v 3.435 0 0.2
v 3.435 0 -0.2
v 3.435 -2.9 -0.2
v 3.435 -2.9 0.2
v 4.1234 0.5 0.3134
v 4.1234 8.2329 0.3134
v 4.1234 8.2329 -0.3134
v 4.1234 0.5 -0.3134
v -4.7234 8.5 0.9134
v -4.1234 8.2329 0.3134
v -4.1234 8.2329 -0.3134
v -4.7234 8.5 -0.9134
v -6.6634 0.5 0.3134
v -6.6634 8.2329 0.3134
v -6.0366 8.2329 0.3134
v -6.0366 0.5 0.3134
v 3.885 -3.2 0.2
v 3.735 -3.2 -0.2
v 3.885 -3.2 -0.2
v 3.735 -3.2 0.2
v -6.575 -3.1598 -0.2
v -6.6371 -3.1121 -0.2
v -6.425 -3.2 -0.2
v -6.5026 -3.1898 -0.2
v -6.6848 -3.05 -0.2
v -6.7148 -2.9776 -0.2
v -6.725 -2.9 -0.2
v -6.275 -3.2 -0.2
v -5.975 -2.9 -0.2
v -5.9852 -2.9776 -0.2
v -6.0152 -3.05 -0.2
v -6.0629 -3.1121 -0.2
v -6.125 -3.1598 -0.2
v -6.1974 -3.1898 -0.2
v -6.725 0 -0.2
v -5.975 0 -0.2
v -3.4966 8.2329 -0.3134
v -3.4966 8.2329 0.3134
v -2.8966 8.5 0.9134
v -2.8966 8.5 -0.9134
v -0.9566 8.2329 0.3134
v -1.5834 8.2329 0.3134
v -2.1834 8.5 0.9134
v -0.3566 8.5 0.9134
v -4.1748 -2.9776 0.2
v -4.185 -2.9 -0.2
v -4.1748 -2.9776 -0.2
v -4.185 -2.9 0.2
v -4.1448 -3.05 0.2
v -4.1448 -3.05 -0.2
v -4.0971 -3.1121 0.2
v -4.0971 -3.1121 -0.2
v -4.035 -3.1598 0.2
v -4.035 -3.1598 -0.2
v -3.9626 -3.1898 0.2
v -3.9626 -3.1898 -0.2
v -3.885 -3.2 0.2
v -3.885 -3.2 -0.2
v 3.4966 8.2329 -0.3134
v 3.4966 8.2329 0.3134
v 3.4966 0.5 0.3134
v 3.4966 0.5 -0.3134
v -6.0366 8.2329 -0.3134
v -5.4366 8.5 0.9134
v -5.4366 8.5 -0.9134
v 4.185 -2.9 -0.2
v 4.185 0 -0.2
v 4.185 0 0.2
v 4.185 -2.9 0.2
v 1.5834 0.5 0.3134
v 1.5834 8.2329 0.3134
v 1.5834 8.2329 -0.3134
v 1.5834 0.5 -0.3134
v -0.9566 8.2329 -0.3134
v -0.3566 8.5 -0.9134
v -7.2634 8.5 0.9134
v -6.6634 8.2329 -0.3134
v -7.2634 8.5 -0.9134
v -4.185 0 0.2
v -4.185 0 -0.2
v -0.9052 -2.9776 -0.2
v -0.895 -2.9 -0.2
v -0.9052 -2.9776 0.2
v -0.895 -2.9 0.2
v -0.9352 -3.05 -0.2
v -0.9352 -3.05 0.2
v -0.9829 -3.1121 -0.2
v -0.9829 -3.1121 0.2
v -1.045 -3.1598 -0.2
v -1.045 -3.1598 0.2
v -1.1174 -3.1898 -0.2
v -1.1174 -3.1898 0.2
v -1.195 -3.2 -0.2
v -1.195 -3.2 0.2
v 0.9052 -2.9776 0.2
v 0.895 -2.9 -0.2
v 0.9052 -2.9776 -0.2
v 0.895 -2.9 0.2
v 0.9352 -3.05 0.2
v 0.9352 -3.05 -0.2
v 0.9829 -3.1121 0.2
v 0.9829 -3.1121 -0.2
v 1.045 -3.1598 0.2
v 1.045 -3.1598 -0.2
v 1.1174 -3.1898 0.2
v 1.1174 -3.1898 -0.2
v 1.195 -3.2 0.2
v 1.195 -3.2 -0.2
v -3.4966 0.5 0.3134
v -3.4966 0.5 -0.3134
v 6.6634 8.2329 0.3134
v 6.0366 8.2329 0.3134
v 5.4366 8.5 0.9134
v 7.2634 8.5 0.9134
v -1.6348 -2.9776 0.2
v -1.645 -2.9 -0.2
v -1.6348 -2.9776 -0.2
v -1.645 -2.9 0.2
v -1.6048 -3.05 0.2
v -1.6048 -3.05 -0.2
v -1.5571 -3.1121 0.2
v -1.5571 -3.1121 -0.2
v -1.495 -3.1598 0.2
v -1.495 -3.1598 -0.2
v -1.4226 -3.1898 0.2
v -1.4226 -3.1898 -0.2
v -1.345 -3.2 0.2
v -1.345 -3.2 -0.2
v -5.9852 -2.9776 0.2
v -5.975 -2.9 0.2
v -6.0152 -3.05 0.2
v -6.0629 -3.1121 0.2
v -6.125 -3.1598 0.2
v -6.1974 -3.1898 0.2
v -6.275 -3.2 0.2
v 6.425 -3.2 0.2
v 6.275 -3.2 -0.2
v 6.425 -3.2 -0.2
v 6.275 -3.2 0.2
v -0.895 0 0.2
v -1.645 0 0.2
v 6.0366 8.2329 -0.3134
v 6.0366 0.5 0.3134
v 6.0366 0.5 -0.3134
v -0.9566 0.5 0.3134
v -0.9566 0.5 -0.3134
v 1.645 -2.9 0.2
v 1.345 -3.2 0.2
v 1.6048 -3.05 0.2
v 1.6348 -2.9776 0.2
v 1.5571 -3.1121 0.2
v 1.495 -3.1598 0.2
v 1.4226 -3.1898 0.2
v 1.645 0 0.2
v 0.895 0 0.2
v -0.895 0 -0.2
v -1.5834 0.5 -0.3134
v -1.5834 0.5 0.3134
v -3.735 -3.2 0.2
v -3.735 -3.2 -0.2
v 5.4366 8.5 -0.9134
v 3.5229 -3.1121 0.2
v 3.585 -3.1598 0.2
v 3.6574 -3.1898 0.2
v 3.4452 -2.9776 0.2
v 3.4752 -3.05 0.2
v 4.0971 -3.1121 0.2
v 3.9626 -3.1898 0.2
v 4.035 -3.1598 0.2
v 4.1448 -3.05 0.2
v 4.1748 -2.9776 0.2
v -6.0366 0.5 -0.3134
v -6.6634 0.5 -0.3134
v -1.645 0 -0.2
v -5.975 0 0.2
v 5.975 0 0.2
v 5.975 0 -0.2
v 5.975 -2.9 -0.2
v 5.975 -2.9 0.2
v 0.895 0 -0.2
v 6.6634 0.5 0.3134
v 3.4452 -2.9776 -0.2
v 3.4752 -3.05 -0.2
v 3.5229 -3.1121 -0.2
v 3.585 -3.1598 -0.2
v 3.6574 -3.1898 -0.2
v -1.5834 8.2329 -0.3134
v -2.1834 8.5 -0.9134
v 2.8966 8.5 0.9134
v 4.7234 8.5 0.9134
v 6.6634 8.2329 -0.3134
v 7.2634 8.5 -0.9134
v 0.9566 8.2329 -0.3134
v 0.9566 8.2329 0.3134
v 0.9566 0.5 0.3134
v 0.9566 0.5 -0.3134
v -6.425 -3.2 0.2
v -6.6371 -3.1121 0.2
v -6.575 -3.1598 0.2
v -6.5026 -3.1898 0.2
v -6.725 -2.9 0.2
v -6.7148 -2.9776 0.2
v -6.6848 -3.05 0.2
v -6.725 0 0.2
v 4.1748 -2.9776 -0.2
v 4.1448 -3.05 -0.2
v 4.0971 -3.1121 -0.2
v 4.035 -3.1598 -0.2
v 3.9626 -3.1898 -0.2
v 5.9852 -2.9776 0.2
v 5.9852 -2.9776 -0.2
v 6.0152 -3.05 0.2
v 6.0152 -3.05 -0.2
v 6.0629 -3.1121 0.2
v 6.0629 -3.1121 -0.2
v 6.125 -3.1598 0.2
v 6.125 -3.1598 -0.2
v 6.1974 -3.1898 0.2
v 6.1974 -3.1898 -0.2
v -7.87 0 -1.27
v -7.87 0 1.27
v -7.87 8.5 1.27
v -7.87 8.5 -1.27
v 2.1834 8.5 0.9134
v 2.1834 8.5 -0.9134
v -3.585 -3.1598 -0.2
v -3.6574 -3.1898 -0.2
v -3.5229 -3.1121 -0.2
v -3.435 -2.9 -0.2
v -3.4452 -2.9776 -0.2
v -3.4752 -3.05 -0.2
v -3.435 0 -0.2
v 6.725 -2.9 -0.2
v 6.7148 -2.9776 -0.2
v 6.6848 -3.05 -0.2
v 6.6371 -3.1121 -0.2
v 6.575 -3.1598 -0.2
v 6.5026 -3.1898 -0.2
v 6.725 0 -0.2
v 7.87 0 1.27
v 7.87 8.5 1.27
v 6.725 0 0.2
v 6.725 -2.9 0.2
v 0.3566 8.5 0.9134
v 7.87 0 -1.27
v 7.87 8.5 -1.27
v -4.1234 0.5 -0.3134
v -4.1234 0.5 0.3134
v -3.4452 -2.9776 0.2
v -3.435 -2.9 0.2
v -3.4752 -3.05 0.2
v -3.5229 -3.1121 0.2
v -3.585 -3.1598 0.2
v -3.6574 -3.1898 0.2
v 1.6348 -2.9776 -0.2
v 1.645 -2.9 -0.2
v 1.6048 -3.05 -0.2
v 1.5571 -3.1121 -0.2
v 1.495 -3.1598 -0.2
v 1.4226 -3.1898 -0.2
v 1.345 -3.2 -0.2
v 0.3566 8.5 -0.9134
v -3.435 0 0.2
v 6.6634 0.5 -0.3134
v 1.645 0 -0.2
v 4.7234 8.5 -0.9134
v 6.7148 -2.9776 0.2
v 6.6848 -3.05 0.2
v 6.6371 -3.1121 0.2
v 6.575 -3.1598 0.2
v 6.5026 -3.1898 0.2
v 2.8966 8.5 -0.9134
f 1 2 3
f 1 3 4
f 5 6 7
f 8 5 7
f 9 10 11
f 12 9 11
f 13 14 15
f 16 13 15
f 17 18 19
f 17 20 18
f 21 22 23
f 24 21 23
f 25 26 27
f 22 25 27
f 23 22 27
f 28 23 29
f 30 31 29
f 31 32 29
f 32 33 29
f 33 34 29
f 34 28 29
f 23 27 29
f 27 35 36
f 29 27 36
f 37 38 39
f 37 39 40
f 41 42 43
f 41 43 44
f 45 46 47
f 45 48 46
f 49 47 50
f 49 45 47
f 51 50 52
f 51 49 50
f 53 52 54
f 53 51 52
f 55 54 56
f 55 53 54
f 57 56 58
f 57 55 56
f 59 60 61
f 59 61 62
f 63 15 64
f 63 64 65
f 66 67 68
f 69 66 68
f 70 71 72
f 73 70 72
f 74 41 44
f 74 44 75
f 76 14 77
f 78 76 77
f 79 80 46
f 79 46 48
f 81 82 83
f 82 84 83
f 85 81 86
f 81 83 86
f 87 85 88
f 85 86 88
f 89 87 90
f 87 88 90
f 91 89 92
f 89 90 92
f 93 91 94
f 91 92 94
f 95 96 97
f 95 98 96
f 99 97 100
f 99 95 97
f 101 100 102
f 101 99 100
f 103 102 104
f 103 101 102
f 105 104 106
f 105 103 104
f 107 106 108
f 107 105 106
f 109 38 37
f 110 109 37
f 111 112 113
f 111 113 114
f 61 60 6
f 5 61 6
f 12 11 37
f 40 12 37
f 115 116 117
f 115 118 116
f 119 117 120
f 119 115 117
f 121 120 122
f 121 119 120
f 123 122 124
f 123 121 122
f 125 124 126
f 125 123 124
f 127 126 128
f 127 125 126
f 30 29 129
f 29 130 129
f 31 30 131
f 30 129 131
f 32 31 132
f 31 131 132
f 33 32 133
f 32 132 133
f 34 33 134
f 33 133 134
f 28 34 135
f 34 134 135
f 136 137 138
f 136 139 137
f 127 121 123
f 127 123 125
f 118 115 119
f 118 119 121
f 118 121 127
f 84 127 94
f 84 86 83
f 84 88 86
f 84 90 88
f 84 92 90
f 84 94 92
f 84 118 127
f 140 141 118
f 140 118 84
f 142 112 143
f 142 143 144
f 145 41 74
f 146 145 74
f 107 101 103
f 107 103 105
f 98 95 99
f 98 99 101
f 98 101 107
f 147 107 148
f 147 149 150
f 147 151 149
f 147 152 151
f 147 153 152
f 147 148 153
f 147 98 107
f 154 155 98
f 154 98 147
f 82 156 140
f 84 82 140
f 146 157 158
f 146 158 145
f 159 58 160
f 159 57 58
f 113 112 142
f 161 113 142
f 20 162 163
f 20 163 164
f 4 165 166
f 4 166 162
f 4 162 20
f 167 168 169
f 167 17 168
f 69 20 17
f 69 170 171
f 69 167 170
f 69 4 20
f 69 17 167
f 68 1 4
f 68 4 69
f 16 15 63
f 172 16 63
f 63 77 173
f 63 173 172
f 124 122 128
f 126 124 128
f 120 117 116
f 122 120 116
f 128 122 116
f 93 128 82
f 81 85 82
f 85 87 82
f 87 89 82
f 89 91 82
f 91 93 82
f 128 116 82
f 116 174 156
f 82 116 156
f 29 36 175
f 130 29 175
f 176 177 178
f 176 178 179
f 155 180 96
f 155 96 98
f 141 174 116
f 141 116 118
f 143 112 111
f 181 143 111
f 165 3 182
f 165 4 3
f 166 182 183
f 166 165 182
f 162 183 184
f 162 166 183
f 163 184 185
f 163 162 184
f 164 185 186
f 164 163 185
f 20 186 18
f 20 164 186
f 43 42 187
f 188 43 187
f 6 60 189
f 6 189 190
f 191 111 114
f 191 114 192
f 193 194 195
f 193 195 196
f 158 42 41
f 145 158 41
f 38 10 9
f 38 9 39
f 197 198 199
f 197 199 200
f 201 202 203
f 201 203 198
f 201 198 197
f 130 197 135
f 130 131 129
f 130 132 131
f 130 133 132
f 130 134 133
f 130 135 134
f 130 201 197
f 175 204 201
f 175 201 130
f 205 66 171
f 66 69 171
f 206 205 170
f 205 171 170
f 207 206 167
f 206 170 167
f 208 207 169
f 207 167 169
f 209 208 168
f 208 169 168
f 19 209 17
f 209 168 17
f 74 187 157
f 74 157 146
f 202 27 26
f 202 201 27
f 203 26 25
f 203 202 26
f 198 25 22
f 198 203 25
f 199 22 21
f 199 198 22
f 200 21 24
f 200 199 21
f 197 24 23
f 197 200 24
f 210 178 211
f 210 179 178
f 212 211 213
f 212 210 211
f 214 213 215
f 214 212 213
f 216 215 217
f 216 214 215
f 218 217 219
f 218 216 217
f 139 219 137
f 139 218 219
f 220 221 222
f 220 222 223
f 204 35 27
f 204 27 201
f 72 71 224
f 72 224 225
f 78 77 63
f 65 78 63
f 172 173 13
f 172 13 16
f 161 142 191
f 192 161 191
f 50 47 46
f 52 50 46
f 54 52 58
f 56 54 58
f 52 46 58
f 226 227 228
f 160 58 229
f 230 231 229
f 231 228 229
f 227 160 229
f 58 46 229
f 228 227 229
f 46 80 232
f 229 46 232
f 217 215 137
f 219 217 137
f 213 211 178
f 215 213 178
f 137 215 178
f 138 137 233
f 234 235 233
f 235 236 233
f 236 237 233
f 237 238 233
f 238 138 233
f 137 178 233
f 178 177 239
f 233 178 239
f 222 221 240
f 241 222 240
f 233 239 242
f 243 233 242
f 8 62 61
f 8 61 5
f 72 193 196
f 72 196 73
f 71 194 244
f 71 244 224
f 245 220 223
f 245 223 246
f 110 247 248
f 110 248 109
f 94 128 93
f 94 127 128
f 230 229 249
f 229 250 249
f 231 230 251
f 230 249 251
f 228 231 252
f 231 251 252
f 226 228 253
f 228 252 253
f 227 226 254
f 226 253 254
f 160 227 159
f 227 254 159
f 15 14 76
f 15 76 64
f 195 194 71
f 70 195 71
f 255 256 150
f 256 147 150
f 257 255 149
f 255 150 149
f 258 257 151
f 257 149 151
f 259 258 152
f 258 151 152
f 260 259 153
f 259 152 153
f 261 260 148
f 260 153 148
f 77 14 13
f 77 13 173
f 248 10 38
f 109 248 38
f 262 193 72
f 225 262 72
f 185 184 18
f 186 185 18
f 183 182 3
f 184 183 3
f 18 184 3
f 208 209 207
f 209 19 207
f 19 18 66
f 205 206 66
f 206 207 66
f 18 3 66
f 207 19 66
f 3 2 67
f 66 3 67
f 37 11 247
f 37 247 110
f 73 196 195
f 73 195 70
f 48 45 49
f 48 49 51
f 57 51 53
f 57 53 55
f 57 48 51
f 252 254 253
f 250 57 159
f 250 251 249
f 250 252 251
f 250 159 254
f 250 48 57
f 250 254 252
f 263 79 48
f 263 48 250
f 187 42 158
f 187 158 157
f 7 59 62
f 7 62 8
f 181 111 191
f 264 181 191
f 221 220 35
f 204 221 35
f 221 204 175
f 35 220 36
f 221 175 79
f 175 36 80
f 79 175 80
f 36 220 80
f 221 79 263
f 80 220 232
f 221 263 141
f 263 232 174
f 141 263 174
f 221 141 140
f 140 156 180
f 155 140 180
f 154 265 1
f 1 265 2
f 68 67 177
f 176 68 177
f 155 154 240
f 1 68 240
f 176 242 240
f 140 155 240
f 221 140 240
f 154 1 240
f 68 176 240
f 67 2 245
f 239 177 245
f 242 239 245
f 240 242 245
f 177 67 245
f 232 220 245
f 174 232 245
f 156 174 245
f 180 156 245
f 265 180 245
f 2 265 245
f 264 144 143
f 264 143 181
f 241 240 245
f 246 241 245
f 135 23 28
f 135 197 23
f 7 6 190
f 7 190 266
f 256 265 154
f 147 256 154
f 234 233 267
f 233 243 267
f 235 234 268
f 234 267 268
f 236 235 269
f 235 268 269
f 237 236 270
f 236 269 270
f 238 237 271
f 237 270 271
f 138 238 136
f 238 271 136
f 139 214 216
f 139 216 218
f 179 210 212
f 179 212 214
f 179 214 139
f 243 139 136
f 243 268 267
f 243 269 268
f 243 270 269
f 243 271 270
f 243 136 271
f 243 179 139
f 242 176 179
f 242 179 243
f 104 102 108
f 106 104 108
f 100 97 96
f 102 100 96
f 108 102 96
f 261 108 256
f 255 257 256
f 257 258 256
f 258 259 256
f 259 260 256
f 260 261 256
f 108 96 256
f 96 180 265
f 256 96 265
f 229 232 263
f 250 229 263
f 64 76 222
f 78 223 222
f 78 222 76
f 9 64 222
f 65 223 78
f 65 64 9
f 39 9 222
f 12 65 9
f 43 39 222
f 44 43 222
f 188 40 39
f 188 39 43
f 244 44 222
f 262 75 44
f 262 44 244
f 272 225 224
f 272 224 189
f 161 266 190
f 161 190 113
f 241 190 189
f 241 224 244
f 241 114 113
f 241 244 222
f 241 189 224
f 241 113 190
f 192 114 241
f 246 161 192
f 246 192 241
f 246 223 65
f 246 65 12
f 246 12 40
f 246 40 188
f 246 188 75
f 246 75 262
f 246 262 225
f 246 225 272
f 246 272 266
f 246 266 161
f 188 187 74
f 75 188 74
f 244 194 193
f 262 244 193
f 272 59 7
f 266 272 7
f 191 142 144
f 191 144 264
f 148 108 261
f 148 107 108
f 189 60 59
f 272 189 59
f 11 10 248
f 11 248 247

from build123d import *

# Parameters (mm, degrees)
ESQUISSE1_W             = 15.74
ESQUISSE1_H             = 2.54
BOSS_EXTRU_1_DEPTH      = 8.5
ESQUISSE3_W             = 0.626711562
ESQUISSE3_H             = 0.626711562
ENL_V_MAT_EXTRU_3_DEPTH = 8
CHANFREIN3_SIZE         = 0.6
CHANFREIN3_SIZE2        = 0.267137211
ESQUISSE6_W             = 0.75
ESQUISSE6_H             = 0.4
BOSS_EXTRU_3_DEPTH      = 3.2
CONG_1_R                = 0.3


with BuildPart() as part:
    # Esquisse1 → Boss.-Extru.1 (new body)
    with BuildSketch(Plane(origin=(0, 0, 0), x_dir=(1, 0, 0), z_dir=(0, 1, 0))):
        Rectangle(ESQUISSE1_W, ESQUISSE1_H)
    extrude(amount=BOSS_EXTRU_1_DEPTH)

    # Esquisse3 → Enlèv. mat.-Extru.3 (cut)
    with BuildSketch(Plane(origin=(0, 8.5, 0), x_dir=(1, 0, 0), z_dir=(0, 1, 0))):
        with Locations((-6.35, 0)):
            Rectangle(ESQUISSE3_W, ESQUISSE3_H)
        with Locations((-3.81, 0)):
            Rectangle(ESQUISSE3_W, ESQUISSE3_H)
        with Locations((-1.27, 0)):
            Rectangle(ESQUISSE3_W, ESQUISSE3_H)
        with Locations((1.27, 0)):
            Rectangle(ESQUISSE3_W, ESQUISSE3_H)
        with Locations((3.81, 0)):
            Rectangle(ESQUISSE3_W, ESQUISSE3_H)
        with Locations((6.35, 0)):
            Rectangle(ESQUISSE3_W, ESQUISSE3_H)
    extrude(amount=-ENL_V_MAT_EXTRU_3_DEPTH, mode=Mode.SUBTRACT)

    # Chanfrein3
    chanfrein3_edges = [part.edges().sort_by_distance(p)[0] for p in [
        (-3.81, 8.5, -0.313355781),
        (-3.496644219, 8.5, 0),
        (-4.123355781, 8.5, 0),
        (-3.81, 8.5, 0.313355781),
        (-6.35, 8.5, -0.313355781),
        (-6.036644219, 8.5, 0),
        (-6.663355781, 8.5, 0),
        (-6.35, 8.5, 0.313355781),
        (3.81, 8.5, -0.313355781),
        (4.123355781, 8.5, 0),
        (3.496644219, 8.5, 0),
        (3.81, 8.5, 0.313355781),
        (1.27, 8.5, -0.313355781),
        (1.583355781, 8.5, 0),
        (0.956644219, 8.5, 0),
        (1.27, 8.5, 0.313355781),
        (-1.27, 8.5, -0.313355781),
        (-0.956644219, 8.5, 0),
        (-1.583355781, 8.5, 0),
        (-1.27, 8.5, 0.313355781),
        (6.35, 8.5, -0.313355781),
        (6.663355781, 8.5, 0),
        (6.036644219, 8.5, 0),
        (6.35, 8.5, 0.313355781),
    ]]
    chanfrein3_side = [part.faces().sort_by_distance(p)[0] for p in [
        (0, 8.5, 0),
    ]]
    chamfer(chanfrein3_edges, length=CHANFREIN3_SIZE, length2=CHANFREIN3_SIZE2, reference=chanfrein3_side[0])

    # Esquisse6 → Boss.-Extru.3 (add)
    with BuildSketch(Plane.XZ):
        with Locations((-6.35, 0)):
            Rectangle(ESQUISSE6_W, ESQUISSE6_H)
        with Locations((-3.81, 0)):
            Rectangle(ESQUISSE6_W, ESQUISSE6_H)
        with Locations((-1.27, 0)):
            Rectangle(ESQUISSE6_W, ESQUISSE6_H)
        with Locations((1.27, 0)):
            Rectangle(ESQUISSE6_W, ESQUISSE6_H)
        with Locations((3.81, 0)):
            Rectangle(ESQUISSE6_W, ESQUISSE6_H)
        with Locations((6.35, 0)):
            Rectangle(ESQUISSE6_W, ESQUISSE6_H)
    extrude(amount=BOSS_EXTRU_3_DEPTH)

    # Congé1
    cong_1_edges = [part.edges().sort_by_distance(p)[0] for p in [
        (-5.975, -3.2, 0),
        (-6.725, -3.2, 0),
        (-3.435, -3.2, 0),
        (-4.185, -3.2, 0),
        (-0.895, -3.2, 0),
        (-1.645, -3.2, 0),
        (1.645, -3.2, 0),
        (0.895, -3.2, 0),
        (4.185, -3.2, 0),
        (3.435, -3.2, 0),
        (6.725, -3.2, 0),
        (5.975, -3.2, 0),
    ]]
    fillet(cong_1_edges, radius=CONG_1_R)


solid = part.part
